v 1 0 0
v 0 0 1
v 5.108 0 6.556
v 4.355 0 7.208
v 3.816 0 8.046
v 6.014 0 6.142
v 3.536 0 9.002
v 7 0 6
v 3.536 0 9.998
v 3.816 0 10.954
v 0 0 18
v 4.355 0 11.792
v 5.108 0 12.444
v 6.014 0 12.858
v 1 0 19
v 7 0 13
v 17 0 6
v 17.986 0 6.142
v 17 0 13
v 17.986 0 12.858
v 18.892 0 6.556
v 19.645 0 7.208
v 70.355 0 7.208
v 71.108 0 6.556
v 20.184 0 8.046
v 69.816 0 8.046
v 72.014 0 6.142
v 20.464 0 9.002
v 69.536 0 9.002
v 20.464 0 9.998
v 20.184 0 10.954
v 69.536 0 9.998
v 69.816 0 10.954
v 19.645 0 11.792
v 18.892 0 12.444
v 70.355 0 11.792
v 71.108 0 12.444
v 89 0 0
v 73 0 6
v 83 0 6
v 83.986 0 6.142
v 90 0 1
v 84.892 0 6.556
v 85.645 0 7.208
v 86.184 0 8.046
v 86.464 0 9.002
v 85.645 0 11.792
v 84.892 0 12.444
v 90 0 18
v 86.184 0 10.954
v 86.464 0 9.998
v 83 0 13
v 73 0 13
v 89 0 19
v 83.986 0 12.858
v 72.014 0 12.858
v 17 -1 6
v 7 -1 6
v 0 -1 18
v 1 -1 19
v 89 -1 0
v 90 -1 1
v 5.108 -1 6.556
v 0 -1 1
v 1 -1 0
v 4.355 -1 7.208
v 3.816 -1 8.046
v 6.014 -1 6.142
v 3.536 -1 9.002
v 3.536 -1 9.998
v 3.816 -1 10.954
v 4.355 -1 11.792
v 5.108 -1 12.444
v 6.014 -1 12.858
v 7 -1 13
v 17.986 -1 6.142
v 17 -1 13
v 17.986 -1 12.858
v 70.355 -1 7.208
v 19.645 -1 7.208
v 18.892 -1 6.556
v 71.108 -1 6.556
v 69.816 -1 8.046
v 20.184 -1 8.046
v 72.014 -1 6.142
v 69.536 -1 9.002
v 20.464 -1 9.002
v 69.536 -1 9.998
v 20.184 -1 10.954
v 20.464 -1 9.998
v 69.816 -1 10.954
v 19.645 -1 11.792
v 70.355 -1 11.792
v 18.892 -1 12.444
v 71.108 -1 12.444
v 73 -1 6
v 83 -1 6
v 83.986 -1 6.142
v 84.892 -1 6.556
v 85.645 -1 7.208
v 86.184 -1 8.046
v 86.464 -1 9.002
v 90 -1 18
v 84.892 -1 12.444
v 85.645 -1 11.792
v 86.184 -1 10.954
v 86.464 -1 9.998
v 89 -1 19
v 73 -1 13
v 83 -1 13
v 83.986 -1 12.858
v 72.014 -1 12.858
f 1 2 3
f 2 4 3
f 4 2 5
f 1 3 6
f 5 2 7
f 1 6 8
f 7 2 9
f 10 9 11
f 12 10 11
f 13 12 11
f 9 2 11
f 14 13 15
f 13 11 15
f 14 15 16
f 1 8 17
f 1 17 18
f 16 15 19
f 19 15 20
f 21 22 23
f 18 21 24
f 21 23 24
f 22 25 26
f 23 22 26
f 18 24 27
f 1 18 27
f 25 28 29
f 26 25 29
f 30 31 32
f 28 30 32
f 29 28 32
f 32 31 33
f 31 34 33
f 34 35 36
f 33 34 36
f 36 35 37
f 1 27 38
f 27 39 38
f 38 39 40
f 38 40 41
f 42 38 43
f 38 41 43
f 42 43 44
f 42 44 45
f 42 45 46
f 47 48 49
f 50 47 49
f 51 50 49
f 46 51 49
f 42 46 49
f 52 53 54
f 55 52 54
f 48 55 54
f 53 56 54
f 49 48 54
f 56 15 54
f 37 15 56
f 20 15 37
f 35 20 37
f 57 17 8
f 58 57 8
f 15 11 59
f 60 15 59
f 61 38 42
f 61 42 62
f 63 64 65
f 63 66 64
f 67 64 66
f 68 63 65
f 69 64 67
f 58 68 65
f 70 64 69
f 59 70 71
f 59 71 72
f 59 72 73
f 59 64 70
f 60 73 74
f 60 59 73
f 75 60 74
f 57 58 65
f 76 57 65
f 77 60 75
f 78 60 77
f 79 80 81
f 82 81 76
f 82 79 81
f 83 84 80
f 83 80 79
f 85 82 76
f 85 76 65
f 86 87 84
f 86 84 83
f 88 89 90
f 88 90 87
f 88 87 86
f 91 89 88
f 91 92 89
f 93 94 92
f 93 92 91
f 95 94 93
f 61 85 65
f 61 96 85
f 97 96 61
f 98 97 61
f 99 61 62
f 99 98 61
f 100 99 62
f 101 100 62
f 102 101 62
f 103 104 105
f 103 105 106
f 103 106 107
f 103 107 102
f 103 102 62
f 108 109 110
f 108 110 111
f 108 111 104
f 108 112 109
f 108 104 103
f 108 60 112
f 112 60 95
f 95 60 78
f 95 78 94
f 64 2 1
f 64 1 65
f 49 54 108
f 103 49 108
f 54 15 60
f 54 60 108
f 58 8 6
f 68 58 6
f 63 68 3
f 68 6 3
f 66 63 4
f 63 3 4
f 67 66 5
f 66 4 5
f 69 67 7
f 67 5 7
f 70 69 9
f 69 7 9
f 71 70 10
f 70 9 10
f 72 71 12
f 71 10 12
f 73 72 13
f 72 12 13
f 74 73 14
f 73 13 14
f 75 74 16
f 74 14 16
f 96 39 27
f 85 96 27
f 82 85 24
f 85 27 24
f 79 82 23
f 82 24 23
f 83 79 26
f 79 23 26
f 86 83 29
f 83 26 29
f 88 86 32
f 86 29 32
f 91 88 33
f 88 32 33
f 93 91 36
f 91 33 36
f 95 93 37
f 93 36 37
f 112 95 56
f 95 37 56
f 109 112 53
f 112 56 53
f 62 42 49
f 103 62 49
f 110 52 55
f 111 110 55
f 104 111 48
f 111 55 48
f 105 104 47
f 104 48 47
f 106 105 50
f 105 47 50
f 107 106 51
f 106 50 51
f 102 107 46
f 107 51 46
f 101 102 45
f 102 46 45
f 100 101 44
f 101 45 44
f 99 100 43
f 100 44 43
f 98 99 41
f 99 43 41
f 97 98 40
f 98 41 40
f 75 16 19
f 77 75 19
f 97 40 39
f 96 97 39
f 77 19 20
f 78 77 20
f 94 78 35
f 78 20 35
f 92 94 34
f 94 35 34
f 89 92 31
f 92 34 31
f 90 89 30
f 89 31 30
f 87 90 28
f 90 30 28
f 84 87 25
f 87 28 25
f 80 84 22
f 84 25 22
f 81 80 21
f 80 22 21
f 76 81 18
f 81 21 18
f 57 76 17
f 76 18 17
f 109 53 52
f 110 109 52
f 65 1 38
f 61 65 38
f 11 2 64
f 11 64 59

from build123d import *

# Parameters (mm, degrees)
F0_W     = 90
F0_H     = 19
F1_DEPTH = 1
F2_SIZE  = 1
F3_SIZE  = 1
F4_SIZE  = 1
F5_SIZE  = 1


# Not quite as in the source:
# - ends of sketch curves that miss each other by under 0.0002 mm in the source are joined


with BuildPart() as f1:
    # F0 (on Front) → F1 (new body)
    with BuildSketch(Plane.XZ):
        with Locations((45, 9.5)):
            Rectangle(F0_W, F0_H)
        with BuildLine():
            Line((17, 6), (7, 6))
            ThreePointArc((7, 6), (3.5, 9.5), (7, 13))
            Line((7, 13), (17, 13))
            ThreePointArc((17, 13), (20.4999967813, 9.5), (17, 6))
        make_face(mode=Mode.SUBTRACT)
        with BuildLine():
            ThreePointArc((83, 13), (86.5, 9.5), (83, 6))
            Line((83, 6), (73.0000032187, 6))
            ThreePointArc((73.0000032187, 6), (69.5000032187, 9.5), (73.0000032187, 13))
            Line((73.0000032187, 13), (83, 13))
        make_face(mode=Mode.SUBTRACT)
    extrude(amount=F1_DEPTH)

    # F2
    f2_edges = [f1.edges().sort_by_distance(p)[0] for p in [
        (90, -0.5, 19),
    ]]
    chamfer(f2_edges, length=F2_SIZE)

    # F3
    f3_edges = [f1.edges().sort_by_distance(p)[0] for p in [
        (90, -0.5, 0),
    ]]
    chamfer(f3_edges, length=F3_SIZE)

    # F4
    f4_edges = [f1.edges().sort_by_distance(p)[0] for p in [
        (0, -0.5, 19),
    ]]
    chamfer(f4_edges, length=F4_SIZE)

    # F5
    f5_edges = [f1.edges().sort_by_distance(p)[0] for p in [
        (0, -0.5, 0),
    ]]
    chamfer(f5_edges, length=F5_SIZE)


solid = f1.part
